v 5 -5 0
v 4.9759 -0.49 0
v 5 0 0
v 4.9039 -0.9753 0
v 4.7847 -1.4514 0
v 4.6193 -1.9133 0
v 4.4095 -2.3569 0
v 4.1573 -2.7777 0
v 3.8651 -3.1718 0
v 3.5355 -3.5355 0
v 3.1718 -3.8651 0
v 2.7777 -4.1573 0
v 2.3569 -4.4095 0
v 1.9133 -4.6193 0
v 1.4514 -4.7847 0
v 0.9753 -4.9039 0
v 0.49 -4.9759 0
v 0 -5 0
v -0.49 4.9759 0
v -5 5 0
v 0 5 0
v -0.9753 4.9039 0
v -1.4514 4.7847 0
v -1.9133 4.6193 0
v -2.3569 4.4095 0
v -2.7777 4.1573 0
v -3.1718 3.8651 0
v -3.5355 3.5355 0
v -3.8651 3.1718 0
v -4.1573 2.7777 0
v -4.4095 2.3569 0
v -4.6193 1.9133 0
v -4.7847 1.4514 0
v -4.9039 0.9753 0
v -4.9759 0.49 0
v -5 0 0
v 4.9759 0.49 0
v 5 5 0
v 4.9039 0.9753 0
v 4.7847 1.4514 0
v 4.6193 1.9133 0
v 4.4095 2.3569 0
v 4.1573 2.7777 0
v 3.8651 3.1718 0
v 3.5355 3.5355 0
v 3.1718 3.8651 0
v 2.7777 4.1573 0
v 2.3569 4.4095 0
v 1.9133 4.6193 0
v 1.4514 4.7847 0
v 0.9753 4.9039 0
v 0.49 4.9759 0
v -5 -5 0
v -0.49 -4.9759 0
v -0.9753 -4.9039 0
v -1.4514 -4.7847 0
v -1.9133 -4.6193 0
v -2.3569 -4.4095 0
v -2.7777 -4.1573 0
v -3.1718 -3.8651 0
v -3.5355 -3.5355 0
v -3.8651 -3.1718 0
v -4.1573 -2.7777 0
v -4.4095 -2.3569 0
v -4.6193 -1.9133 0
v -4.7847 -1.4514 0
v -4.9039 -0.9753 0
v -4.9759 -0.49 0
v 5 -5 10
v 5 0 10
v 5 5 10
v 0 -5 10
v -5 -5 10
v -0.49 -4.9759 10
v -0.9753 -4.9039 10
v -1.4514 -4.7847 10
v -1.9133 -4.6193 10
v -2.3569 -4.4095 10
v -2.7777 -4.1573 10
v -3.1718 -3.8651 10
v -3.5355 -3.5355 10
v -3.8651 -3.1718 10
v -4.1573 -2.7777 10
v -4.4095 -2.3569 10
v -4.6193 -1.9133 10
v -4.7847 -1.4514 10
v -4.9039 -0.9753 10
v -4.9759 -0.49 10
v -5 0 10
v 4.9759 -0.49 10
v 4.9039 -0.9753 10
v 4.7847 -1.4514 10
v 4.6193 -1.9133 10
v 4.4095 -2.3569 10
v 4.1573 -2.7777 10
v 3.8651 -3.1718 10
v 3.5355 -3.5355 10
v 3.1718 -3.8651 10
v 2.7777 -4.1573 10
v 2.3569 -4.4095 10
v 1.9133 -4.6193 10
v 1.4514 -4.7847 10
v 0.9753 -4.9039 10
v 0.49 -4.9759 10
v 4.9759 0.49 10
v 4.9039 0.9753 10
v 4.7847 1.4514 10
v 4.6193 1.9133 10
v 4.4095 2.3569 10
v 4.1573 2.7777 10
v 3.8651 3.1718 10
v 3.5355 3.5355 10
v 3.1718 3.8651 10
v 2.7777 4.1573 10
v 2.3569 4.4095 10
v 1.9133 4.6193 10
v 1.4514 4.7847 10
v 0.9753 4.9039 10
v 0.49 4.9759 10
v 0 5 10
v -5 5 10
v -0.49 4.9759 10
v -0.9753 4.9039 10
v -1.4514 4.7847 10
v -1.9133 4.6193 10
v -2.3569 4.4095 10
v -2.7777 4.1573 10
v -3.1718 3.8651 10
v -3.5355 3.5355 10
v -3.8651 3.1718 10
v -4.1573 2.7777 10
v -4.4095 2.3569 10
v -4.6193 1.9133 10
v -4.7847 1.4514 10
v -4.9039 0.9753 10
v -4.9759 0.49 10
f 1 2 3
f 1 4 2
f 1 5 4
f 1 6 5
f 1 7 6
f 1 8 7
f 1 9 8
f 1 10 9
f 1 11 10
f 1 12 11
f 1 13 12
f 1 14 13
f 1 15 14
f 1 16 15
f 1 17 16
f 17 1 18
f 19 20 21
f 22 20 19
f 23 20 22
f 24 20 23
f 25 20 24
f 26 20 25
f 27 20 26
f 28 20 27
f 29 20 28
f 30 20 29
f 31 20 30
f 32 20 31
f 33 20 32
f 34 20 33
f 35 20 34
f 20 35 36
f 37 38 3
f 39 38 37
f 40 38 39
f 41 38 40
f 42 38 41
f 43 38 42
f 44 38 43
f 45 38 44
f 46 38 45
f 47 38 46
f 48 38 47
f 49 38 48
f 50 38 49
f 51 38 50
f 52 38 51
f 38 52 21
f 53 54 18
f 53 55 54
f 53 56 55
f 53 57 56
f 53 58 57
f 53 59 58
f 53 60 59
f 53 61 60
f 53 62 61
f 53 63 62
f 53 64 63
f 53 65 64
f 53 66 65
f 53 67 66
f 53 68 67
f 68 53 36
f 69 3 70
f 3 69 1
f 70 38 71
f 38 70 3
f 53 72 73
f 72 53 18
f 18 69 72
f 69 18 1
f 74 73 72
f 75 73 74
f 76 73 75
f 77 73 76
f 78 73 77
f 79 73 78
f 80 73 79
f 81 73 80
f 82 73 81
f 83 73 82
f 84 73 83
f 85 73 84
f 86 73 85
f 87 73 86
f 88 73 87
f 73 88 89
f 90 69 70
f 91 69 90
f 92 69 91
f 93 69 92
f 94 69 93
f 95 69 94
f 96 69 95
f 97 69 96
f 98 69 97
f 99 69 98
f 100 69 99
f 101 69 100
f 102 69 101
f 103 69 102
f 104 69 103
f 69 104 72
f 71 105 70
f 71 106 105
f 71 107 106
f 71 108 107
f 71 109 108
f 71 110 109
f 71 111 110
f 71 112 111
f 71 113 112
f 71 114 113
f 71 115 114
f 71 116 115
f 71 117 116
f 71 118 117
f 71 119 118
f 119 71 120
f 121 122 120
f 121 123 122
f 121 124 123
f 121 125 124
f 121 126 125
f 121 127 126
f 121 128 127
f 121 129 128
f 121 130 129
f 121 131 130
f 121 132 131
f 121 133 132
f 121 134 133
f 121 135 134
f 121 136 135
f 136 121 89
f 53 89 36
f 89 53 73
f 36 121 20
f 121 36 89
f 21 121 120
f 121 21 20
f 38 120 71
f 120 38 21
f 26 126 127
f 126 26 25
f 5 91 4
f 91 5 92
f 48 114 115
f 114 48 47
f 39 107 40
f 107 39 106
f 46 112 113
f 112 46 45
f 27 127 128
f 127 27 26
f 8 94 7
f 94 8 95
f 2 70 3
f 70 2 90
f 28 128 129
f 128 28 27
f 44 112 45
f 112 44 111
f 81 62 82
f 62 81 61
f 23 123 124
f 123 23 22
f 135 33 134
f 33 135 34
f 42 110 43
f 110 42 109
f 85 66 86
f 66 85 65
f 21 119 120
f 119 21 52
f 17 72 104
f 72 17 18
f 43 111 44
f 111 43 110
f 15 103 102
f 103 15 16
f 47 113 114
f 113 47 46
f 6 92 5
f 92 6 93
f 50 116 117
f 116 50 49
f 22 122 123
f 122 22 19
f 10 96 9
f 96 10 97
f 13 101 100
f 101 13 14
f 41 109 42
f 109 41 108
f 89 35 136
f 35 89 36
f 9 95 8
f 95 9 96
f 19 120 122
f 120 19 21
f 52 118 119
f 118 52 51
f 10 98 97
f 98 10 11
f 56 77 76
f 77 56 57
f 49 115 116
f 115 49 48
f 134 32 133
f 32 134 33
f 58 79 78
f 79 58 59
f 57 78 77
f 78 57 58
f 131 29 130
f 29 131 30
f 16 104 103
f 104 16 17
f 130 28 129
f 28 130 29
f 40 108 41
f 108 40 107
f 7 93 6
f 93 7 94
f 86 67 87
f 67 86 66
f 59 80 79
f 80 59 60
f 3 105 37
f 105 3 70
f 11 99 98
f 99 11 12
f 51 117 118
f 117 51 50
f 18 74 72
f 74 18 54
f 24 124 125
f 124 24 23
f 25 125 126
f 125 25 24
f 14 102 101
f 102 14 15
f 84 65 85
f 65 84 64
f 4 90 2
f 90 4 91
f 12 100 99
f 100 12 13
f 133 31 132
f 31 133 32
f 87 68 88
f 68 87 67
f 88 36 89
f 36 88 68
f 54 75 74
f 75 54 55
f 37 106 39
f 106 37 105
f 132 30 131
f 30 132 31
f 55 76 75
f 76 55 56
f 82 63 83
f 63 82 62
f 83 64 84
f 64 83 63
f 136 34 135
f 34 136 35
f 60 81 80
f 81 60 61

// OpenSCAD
difference()
{
    linear_extrude(height = 10.0, twist = 0.0, scale = 1.0, slices = 1, center = false)
    {
        scale([10.0, 10.0])
        {
            M8();
        }
    }
    linear_extrude(height = 15.0, twist = 0.0, scale = 1.0, slices = 1, center = false)
    {
        scale([10.0, 10.0])
        {
            M273();
        }
    }
}

module M273()
{
    polygon
    (
        points =
        [
            [0.5, 0.0], 
            [0.49759236333609846, 0.0490085701647803], 
            [0.4903926402016152, 0.09754516100806412], 
            [0.4784701678661044, 0.14514233862723117], 
            [0.46193976625564337, 0.1913417161825449], 
            [0.4409606321741775, 0.23569836841299882], 
            [0.4157348061512726, 0.2777851165098011], 
            [0.3865052266813685, 0.31719664208182274], 
            [0.3535533905932738, 0.35355339059327373], 
            [0.31719664208182274, 0.3865052266813685], 
            [0.27778511650980114, 0.4157348061512726], 
            [0.2356983684129989, 0.44096063217417747], 
            [0.19134171618254492, 0.46193976625564337], 
            [0.14514233862723117, 0.47847016786610447], 
            [0.09754516100806417, 0.4903926402016152], 
            [0.049008570164780385, 0.4975923633360984], 
            [3.061616997868383E-17, 0.5], 
            [-0.04900857016478032, 0.49759236333609846], 
            [-0.0975451610080641, 0.4903926402016152], 
            [-0.14514233862723108, 0.47847016786610447], 
            [-0.19134171618254486, 0.46193976625564337], 
            [-0.23569836841299885, 0.4409606321741775], 
            [-0.277785116509801, 0.41573480615127273], 
            [-0.3171966420818227, 0.38650522668136855], 
            [-0.35355339059327373, 0.3535533905932738], 
            [-0.3865052266813685, 0.31719664208182274], 
            [-0.4157348061512727, 0.2777851165098011], 
            [-0.44096063217417747, 0.23569836841299893], 
            [-0.46193976625564337, 0.19134171618254495], 
            [-0.4784701678661044, 0.1451423386272312], 
            [-0.4903926402016152, 0.0975451610080643], 
            [-0.4975923633360984, 0.04900857016478041], 
            [-0.5, 6.123233995736766E-17], 
            [-0.49759236333609846, -0.049008570164780295], 
            [-0.4903926402016152, -0.09754516100806418], 
            [-0.47847016786610447, -0.14514233862723105], 
            [-0.4619397662556434, -0.19134171618254484], 
            [-0.4409606321741775, -0.23569836841299882], 
            [-0.41573480615127273, -0.277785116509801], 
            [-0.38650522668136855, -0.31719664208182263], 
            [-0.35355339059327384, -0.35355339059327373], 
            [-0.31719664208182297, -0.38650522668136833], 
            [-0.2777851165098011, -0.4157348061512726], 
            [-0.23569836841299893, -0.44096063217417747], 
            [-0.19134171618254517, -0.46193976625564326], 
            [-0.14514233862723122, -0.4784701678661044], 
            [-0.09754516100806433, -0.49039264020161516], 
            [-0.049008570164780225, -0.49759236333609846], 
            [-9.184850993605148E-17, -0.5], 
            [0.049008570164780045, -0.49759236333609846], 
            [0.09754516100806415, -0.4903926402016152], 
            [0.14514233862723103, -0.47847016786610447], 
            [0.191341716182545, -0.4619397662556433], 
            [0.2356983684129988, -0.4409606321741775], 
            [0.2777851165098009, -0.41573480615127273], 
            [0.3171966420818228, -0.38650522668136844], 
            [0.3535533905932737, -0.35355339059327384], 
            [0.38650522668136833, -0.31719664208182297], 
            [0.4157348061512726, -0.2777851165098011], 
            [0.4409606321741774, -0.23569836841299896], 
            [0.46193976625564326, -0.1913417161825452], 
            [0.4784701678661044, -0.14514233862723125], 
            [0.49039264020161516, -0.09754516100806436], 
            [0.49759236333609846, -0.04900857016478025]
        ],
        paths =
        [
            [0, 1, 2, 3, 4, 5, 6, 7, 8, 9, 10, 11, 12, 13, 14, 15, 16, 17, 18, 19, 20, 21, 22, 23, 24, 25, 26, 27, 28, 29, 30, 31, 32, 33, 34, 35, 36, 37, 38, 39, 40, 41, 42, 43, 44, 45, 46, 47, 48, 49, 50, 51, 52, 53, 54, 55, 56, 57, 58, 59, 60, 61, 62, 63]
        ]
    );
}

module M8()
{
    polygon
    (
        points =
        [
            [-0.5, -0.5], 
            [0.5, -0.5], 
            [0.5, 0.5], 
            [-0.5, 0.5]
        ],
        paths =
        [
            [0, 1, 2, 3]
        ]
    );
}
